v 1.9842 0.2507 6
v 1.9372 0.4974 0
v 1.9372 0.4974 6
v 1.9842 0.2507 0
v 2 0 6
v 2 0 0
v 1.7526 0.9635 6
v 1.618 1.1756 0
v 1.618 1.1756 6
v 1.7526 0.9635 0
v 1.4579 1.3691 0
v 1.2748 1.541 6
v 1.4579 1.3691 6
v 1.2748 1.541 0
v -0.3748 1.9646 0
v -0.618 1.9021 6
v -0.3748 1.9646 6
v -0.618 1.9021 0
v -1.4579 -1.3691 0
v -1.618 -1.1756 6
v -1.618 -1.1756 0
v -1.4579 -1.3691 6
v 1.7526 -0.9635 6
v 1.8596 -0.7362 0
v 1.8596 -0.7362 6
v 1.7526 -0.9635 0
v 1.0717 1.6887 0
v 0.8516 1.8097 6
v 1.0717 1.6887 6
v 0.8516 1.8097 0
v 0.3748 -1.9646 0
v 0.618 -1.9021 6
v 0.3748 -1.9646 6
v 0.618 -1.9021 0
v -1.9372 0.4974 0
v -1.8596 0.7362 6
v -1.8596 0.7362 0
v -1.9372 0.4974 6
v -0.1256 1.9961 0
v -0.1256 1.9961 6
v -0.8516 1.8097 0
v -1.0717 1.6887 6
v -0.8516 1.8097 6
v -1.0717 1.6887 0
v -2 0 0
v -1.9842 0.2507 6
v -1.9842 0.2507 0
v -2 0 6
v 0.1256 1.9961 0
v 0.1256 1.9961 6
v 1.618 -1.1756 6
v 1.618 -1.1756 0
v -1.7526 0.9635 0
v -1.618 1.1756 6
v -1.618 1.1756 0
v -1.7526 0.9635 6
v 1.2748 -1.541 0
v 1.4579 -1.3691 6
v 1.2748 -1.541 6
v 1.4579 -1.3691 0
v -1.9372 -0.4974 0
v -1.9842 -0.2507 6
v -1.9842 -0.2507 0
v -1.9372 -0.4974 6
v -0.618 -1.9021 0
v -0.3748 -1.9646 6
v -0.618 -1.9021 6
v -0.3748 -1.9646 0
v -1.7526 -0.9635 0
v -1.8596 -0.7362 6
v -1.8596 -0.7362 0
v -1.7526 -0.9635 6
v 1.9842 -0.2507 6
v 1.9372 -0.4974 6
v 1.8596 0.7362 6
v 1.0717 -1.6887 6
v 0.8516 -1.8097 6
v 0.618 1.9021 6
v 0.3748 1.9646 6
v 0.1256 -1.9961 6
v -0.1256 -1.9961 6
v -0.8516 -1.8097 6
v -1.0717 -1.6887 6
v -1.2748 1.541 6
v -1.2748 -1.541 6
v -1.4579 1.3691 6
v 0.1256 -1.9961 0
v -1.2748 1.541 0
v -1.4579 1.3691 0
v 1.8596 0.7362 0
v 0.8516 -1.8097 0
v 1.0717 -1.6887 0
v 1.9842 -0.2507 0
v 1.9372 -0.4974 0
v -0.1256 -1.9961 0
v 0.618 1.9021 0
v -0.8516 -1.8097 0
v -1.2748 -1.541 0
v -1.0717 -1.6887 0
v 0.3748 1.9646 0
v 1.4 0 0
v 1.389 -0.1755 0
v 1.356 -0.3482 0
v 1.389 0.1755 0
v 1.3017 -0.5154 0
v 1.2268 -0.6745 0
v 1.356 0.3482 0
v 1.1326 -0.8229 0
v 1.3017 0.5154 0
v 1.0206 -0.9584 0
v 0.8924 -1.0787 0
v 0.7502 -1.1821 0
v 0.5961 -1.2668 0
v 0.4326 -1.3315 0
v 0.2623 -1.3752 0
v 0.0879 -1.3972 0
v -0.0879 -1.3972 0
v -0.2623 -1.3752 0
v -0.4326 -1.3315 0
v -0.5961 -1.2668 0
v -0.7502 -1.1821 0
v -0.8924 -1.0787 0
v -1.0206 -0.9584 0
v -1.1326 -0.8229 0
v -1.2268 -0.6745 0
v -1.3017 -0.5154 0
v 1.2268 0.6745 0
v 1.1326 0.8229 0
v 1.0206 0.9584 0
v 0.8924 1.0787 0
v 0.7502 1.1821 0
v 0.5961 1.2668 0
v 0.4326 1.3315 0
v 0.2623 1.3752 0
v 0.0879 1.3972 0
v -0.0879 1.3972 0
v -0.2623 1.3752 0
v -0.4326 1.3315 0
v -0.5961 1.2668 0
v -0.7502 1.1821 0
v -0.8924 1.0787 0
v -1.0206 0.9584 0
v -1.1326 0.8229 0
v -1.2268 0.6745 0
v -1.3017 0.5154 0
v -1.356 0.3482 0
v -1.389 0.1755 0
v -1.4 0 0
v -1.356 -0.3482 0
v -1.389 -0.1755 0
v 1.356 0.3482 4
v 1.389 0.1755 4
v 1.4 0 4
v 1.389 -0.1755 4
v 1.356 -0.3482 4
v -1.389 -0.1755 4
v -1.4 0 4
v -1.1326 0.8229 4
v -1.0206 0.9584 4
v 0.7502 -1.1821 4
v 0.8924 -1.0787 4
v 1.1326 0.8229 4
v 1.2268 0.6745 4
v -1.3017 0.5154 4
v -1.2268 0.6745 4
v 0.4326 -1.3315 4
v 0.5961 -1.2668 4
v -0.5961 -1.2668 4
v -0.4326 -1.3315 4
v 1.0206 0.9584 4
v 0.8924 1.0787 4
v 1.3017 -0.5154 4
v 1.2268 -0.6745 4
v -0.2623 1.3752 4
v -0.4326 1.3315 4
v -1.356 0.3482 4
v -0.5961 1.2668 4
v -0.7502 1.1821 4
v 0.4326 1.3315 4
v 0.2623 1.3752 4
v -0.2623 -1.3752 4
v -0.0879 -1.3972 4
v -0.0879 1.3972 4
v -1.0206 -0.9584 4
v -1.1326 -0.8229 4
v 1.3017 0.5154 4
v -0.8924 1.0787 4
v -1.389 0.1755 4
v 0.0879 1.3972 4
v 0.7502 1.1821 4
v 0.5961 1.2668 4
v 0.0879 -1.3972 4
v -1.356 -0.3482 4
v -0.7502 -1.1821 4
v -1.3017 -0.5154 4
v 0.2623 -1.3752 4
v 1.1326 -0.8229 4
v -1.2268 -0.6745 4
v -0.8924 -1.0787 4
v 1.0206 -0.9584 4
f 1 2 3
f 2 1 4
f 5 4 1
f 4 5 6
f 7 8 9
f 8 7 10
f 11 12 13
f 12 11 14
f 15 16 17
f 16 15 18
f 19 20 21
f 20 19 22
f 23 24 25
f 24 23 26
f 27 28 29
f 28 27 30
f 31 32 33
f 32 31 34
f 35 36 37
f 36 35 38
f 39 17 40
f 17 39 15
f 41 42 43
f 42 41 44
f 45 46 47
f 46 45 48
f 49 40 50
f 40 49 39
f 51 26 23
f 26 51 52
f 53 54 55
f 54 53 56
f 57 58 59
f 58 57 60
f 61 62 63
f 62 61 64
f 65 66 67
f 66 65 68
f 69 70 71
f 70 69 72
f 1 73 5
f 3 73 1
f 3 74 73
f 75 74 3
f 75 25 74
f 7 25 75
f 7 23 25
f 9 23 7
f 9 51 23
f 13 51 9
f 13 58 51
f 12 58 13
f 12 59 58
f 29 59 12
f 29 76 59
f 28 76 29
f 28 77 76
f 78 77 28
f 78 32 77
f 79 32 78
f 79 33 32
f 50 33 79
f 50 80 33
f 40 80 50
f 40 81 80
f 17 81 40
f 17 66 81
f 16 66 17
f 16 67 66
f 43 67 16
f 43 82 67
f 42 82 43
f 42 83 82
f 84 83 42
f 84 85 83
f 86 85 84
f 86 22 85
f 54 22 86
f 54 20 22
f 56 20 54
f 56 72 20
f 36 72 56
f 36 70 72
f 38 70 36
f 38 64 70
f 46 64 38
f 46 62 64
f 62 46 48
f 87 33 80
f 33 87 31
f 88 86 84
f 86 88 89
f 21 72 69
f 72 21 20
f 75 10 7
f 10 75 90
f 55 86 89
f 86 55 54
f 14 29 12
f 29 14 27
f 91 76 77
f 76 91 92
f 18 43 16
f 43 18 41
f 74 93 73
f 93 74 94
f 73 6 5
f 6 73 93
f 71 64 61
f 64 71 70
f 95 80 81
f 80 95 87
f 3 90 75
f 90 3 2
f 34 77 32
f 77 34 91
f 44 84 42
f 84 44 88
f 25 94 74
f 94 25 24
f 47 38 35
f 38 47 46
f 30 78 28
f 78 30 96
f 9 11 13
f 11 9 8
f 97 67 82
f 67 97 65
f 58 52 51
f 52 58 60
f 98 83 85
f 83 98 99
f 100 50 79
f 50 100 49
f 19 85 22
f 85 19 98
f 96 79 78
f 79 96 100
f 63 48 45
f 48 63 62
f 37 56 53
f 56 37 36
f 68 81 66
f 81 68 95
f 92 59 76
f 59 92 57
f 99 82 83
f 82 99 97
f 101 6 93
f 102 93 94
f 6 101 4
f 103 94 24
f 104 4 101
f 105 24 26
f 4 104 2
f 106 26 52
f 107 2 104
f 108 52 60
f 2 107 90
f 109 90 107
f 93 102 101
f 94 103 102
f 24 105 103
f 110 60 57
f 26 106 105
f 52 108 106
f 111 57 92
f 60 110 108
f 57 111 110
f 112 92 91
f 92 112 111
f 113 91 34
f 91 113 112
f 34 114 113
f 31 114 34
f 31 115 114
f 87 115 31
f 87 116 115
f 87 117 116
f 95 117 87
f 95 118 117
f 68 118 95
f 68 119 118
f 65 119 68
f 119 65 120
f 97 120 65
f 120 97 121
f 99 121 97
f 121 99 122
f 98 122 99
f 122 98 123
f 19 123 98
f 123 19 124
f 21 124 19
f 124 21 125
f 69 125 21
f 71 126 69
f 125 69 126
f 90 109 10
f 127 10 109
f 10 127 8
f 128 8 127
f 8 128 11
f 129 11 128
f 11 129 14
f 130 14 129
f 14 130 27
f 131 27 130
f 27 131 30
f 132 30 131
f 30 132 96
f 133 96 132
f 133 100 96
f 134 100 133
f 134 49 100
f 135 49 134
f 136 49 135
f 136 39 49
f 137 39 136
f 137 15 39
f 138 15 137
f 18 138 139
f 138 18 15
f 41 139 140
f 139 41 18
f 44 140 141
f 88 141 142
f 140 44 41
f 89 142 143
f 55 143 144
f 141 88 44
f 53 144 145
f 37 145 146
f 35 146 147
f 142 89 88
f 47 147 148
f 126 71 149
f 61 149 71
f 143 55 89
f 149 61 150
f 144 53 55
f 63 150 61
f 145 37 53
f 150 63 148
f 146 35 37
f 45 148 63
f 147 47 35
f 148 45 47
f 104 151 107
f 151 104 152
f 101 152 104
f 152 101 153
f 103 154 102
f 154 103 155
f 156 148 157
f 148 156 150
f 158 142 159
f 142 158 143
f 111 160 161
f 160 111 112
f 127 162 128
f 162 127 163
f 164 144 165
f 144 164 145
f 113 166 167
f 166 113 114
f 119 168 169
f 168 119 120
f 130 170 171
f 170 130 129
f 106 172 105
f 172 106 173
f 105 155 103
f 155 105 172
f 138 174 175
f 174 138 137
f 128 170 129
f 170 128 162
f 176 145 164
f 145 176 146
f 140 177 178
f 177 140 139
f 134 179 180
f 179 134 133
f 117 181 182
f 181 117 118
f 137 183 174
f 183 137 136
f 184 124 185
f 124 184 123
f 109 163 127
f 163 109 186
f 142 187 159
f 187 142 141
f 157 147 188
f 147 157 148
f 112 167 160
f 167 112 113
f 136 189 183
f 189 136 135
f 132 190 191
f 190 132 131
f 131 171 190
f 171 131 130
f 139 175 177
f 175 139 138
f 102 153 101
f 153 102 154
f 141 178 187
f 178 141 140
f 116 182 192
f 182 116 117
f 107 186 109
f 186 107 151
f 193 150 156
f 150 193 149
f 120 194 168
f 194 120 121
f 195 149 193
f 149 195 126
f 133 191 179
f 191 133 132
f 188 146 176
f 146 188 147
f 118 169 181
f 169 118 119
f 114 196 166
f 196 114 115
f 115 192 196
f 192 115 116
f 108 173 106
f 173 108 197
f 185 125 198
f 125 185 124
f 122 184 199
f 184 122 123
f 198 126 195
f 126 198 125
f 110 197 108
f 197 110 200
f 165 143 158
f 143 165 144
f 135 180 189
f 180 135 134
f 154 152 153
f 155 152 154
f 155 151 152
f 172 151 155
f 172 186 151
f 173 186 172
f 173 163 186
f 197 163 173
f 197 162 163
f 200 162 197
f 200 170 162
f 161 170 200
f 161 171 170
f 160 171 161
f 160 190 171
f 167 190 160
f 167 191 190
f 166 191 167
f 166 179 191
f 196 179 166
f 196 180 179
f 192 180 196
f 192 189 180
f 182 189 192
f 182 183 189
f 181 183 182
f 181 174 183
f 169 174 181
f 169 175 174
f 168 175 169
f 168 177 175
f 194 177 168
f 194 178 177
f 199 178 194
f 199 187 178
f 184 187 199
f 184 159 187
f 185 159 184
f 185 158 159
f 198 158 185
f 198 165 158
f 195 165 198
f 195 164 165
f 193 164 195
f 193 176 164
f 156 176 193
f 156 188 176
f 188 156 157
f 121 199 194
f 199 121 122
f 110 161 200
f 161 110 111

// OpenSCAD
$fn=50;

difference() {
    
    cylinder(h=6,d=4);
    cylinder(h=4,d=2.8);
}
